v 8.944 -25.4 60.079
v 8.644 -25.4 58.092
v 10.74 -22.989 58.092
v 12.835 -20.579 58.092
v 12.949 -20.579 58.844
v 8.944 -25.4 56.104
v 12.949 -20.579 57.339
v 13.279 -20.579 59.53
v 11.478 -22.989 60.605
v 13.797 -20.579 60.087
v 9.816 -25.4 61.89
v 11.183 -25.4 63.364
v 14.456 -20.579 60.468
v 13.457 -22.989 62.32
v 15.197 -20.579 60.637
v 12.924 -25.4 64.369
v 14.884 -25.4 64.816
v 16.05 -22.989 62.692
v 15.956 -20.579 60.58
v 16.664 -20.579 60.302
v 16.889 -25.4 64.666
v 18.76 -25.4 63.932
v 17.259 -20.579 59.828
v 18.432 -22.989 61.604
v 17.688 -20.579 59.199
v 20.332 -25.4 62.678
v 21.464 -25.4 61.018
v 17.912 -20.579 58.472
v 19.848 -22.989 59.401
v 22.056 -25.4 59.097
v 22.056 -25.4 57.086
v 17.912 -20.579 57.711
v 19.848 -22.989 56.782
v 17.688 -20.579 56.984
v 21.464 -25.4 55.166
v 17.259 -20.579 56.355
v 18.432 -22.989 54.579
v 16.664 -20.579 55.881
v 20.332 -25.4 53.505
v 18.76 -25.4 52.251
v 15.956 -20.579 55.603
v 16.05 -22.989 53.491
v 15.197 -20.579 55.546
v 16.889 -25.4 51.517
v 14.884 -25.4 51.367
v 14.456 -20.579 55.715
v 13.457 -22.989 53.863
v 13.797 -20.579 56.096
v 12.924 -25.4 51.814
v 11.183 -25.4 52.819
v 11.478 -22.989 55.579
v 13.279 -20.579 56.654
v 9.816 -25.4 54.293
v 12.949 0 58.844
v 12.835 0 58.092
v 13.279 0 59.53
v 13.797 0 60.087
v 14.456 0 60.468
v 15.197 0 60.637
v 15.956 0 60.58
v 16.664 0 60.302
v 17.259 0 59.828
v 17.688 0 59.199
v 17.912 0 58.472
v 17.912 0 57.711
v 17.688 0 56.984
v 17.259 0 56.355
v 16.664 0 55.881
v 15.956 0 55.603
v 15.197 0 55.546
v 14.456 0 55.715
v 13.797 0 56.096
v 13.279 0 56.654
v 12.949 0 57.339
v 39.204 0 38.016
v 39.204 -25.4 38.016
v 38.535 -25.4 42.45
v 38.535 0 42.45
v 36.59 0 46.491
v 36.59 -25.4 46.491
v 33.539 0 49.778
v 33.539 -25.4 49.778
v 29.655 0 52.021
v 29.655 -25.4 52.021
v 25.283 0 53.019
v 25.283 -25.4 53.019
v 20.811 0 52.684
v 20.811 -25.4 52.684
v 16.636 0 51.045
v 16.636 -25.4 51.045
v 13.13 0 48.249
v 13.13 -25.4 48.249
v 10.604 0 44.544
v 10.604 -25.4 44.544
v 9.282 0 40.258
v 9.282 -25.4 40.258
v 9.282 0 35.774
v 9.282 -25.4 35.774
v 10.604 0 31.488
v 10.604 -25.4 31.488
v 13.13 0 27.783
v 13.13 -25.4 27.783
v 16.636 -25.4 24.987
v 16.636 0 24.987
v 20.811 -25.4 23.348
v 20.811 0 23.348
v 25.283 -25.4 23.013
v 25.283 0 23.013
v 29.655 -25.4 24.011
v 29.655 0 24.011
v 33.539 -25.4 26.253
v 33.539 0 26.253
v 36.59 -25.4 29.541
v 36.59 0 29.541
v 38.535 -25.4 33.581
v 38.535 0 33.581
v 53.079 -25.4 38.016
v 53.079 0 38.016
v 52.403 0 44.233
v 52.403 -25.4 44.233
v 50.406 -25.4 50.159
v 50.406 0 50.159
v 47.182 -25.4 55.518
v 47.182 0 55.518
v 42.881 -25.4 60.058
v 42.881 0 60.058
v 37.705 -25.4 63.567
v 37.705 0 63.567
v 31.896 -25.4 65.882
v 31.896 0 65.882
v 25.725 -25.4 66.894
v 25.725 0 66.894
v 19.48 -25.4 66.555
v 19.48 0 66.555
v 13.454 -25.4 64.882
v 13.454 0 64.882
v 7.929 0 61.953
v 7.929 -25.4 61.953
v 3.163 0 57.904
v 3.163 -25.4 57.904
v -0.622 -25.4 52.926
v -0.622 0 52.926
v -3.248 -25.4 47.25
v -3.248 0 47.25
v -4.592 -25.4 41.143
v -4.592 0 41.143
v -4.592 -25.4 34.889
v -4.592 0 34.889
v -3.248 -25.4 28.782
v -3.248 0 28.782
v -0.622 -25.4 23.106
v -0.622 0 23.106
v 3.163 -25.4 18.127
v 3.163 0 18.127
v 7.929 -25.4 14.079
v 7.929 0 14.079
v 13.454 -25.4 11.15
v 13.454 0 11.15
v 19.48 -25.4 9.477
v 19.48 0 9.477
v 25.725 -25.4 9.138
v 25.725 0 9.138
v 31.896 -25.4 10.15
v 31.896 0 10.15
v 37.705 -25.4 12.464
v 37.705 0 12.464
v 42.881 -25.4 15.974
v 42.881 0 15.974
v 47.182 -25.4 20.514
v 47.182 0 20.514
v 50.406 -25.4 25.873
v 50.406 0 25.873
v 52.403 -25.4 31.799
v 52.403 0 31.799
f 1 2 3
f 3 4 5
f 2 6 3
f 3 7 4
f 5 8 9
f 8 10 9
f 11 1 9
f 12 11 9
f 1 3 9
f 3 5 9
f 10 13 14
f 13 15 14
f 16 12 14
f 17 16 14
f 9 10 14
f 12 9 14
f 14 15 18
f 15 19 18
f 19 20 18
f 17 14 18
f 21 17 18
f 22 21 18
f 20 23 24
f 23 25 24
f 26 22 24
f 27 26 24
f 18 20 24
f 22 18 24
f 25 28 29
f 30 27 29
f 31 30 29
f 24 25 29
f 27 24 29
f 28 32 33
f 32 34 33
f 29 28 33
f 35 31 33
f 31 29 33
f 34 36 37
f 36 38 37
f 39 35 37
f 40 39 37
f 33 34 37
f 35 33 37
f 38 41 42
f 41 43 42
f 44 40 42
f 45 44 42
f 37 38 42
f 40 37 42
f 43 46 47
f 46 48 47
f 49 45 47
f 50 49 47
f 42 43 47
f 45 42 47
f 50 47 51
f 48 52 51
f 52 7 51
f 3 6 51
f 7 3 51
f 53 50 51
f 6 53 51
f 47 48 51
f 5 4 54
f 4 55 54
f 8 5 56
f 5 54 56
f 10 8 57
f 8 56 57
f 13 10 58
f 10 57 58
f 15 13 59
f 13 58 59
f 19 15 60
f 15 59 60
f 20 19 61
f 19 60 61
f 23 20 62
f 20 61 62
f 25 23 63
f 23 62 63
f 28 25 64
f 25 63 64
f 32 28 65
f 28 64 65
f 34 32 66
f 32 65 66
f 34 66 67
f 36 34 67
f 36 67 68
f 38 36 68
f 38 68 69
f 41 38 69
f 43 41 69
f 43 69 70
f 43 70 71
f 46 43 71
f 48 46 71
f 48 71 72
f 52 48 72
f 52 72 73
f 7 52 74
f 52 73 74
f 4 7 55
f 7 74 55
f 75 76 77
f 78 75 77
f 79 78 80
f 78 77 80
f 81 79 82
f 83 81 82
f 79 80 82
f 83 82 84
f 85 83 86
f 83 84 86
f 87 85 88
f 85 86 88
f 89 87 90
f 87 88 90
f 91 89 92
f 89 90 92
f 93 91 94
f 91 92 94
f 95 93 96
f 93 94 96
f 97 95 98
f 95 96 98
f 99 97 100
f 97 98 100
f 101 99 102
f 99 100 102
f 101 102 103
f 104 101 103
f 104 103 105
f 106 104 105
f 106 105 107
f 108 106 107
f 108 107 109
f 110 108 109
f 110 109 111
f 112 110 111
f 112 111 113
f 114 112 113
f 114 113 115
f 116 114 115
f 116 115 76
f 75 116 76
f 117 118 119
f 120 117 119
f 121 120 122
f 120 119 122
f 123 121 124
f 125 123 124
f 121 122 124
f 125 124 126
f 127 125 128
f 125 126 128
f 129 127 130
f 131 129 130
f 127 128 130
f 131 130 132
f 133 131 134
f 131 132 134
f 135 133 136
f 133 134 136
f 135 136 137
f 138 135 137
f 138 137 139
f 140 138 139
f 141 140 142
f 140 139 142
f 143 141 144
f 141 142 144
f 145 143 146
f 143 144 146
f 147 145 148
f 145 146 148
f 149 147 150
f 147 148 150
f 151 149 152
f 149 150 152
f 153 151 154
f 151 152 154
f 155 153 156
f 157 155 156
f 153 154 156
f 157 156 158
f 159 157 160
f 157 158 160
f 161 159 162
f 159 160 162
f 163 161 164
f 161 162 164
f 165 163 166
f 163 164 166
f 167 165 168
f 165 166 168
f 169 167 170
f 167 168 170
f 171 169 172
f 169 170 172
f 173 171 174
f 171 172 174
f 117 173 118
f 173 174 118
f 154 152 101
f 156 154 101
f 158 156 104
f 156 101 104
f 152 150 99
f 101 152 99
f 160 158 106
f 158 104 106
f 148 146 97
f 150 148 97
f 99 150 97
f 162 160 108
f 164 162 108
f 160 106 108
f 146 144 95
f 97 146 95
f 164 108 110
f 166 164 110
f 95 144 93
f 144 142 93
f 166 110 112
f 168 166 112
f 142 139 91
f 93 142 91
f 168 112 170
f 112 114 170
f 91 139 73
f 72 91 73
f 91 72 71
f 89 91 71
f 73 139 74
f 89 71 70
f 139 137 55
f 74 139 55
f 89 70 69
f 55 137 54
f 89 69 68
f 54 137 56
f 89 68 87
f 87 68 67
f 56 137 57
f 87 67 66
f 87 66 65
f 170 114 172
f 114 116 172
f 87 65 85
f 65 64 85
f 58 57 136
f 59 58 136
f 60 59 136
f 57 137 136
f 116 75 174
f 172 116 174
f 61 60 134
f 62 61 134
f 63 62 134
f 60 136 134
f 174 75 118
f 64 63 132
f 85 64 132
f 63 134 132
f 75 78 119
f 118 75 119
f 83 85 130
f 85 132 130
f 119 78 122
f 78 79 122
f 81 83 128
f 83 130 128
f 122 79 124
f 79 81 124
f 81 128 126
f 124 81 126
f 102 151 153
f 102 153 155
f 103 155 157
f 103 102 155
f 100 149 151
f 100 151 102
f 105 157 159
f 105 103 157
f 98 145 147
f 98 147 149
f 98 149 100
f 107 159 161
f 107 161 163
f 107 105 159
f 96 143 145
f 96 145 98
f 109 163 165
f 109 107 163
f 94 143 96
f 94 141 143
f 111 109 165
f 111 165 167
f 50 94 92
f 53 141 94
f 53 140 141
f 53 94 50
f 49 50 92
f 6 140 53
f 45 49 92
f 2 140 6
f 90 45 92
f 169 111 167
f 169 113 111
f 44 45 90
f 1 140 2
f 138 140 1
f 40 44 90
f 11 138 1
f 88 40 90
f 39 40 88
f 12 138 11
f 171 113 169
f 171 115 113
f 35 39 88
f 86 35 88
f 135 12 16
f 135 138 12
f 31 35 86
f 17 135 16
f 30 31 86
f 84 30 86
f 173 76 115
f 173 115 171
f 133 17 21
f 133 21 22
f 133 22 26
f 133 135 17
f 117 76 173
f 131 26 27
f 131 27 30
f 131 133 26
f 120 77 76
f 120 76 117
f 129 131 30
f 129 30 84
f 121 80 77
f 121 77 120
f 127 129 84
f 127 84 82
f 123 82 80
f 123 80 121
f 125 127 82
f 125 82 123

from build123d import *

# Parameters (mm, degrees)
F0_R           = 28.9202335228
F1_DEPTH       = 25.4
F2_R           = 15.0449278179
F3_DEPTH       = 25.401
F5_D           = 5.1054
F5_CSINK_D     = 13.4874
F5_CSINK_ANGLE = 82


with BuildPart() as f1:
    # F0 (on Front) → F1 (new body)
    with BuildSketch(Plane.XZ):
        with Locations((24.1588130593, 38.0158424377)):
            Circle(F0_R)
    extrude(amount=F1_DEPTH)

    # F2 (on face) → F3 (cut, through all)
    with BuildSketch(Plane.XZ.offset(25.4)):
        with Locations((24.1588130593, 38.0158424377)):
            Circle(F2_R)
    extrude(amount=-F3_DEPTH, mode=Mode.SUBTRACT)

    # F5 (through all)
    with Locations(Plane.XZ.offset(25.4)):
        with Locations((15.3881106526, 58.0915510654)):
            CounterSinkHole(F5_D / 2, F5_CSINK_D / 2, counter_sink_angle=F5_CSINK_ANGLE)


solid = f1.part
